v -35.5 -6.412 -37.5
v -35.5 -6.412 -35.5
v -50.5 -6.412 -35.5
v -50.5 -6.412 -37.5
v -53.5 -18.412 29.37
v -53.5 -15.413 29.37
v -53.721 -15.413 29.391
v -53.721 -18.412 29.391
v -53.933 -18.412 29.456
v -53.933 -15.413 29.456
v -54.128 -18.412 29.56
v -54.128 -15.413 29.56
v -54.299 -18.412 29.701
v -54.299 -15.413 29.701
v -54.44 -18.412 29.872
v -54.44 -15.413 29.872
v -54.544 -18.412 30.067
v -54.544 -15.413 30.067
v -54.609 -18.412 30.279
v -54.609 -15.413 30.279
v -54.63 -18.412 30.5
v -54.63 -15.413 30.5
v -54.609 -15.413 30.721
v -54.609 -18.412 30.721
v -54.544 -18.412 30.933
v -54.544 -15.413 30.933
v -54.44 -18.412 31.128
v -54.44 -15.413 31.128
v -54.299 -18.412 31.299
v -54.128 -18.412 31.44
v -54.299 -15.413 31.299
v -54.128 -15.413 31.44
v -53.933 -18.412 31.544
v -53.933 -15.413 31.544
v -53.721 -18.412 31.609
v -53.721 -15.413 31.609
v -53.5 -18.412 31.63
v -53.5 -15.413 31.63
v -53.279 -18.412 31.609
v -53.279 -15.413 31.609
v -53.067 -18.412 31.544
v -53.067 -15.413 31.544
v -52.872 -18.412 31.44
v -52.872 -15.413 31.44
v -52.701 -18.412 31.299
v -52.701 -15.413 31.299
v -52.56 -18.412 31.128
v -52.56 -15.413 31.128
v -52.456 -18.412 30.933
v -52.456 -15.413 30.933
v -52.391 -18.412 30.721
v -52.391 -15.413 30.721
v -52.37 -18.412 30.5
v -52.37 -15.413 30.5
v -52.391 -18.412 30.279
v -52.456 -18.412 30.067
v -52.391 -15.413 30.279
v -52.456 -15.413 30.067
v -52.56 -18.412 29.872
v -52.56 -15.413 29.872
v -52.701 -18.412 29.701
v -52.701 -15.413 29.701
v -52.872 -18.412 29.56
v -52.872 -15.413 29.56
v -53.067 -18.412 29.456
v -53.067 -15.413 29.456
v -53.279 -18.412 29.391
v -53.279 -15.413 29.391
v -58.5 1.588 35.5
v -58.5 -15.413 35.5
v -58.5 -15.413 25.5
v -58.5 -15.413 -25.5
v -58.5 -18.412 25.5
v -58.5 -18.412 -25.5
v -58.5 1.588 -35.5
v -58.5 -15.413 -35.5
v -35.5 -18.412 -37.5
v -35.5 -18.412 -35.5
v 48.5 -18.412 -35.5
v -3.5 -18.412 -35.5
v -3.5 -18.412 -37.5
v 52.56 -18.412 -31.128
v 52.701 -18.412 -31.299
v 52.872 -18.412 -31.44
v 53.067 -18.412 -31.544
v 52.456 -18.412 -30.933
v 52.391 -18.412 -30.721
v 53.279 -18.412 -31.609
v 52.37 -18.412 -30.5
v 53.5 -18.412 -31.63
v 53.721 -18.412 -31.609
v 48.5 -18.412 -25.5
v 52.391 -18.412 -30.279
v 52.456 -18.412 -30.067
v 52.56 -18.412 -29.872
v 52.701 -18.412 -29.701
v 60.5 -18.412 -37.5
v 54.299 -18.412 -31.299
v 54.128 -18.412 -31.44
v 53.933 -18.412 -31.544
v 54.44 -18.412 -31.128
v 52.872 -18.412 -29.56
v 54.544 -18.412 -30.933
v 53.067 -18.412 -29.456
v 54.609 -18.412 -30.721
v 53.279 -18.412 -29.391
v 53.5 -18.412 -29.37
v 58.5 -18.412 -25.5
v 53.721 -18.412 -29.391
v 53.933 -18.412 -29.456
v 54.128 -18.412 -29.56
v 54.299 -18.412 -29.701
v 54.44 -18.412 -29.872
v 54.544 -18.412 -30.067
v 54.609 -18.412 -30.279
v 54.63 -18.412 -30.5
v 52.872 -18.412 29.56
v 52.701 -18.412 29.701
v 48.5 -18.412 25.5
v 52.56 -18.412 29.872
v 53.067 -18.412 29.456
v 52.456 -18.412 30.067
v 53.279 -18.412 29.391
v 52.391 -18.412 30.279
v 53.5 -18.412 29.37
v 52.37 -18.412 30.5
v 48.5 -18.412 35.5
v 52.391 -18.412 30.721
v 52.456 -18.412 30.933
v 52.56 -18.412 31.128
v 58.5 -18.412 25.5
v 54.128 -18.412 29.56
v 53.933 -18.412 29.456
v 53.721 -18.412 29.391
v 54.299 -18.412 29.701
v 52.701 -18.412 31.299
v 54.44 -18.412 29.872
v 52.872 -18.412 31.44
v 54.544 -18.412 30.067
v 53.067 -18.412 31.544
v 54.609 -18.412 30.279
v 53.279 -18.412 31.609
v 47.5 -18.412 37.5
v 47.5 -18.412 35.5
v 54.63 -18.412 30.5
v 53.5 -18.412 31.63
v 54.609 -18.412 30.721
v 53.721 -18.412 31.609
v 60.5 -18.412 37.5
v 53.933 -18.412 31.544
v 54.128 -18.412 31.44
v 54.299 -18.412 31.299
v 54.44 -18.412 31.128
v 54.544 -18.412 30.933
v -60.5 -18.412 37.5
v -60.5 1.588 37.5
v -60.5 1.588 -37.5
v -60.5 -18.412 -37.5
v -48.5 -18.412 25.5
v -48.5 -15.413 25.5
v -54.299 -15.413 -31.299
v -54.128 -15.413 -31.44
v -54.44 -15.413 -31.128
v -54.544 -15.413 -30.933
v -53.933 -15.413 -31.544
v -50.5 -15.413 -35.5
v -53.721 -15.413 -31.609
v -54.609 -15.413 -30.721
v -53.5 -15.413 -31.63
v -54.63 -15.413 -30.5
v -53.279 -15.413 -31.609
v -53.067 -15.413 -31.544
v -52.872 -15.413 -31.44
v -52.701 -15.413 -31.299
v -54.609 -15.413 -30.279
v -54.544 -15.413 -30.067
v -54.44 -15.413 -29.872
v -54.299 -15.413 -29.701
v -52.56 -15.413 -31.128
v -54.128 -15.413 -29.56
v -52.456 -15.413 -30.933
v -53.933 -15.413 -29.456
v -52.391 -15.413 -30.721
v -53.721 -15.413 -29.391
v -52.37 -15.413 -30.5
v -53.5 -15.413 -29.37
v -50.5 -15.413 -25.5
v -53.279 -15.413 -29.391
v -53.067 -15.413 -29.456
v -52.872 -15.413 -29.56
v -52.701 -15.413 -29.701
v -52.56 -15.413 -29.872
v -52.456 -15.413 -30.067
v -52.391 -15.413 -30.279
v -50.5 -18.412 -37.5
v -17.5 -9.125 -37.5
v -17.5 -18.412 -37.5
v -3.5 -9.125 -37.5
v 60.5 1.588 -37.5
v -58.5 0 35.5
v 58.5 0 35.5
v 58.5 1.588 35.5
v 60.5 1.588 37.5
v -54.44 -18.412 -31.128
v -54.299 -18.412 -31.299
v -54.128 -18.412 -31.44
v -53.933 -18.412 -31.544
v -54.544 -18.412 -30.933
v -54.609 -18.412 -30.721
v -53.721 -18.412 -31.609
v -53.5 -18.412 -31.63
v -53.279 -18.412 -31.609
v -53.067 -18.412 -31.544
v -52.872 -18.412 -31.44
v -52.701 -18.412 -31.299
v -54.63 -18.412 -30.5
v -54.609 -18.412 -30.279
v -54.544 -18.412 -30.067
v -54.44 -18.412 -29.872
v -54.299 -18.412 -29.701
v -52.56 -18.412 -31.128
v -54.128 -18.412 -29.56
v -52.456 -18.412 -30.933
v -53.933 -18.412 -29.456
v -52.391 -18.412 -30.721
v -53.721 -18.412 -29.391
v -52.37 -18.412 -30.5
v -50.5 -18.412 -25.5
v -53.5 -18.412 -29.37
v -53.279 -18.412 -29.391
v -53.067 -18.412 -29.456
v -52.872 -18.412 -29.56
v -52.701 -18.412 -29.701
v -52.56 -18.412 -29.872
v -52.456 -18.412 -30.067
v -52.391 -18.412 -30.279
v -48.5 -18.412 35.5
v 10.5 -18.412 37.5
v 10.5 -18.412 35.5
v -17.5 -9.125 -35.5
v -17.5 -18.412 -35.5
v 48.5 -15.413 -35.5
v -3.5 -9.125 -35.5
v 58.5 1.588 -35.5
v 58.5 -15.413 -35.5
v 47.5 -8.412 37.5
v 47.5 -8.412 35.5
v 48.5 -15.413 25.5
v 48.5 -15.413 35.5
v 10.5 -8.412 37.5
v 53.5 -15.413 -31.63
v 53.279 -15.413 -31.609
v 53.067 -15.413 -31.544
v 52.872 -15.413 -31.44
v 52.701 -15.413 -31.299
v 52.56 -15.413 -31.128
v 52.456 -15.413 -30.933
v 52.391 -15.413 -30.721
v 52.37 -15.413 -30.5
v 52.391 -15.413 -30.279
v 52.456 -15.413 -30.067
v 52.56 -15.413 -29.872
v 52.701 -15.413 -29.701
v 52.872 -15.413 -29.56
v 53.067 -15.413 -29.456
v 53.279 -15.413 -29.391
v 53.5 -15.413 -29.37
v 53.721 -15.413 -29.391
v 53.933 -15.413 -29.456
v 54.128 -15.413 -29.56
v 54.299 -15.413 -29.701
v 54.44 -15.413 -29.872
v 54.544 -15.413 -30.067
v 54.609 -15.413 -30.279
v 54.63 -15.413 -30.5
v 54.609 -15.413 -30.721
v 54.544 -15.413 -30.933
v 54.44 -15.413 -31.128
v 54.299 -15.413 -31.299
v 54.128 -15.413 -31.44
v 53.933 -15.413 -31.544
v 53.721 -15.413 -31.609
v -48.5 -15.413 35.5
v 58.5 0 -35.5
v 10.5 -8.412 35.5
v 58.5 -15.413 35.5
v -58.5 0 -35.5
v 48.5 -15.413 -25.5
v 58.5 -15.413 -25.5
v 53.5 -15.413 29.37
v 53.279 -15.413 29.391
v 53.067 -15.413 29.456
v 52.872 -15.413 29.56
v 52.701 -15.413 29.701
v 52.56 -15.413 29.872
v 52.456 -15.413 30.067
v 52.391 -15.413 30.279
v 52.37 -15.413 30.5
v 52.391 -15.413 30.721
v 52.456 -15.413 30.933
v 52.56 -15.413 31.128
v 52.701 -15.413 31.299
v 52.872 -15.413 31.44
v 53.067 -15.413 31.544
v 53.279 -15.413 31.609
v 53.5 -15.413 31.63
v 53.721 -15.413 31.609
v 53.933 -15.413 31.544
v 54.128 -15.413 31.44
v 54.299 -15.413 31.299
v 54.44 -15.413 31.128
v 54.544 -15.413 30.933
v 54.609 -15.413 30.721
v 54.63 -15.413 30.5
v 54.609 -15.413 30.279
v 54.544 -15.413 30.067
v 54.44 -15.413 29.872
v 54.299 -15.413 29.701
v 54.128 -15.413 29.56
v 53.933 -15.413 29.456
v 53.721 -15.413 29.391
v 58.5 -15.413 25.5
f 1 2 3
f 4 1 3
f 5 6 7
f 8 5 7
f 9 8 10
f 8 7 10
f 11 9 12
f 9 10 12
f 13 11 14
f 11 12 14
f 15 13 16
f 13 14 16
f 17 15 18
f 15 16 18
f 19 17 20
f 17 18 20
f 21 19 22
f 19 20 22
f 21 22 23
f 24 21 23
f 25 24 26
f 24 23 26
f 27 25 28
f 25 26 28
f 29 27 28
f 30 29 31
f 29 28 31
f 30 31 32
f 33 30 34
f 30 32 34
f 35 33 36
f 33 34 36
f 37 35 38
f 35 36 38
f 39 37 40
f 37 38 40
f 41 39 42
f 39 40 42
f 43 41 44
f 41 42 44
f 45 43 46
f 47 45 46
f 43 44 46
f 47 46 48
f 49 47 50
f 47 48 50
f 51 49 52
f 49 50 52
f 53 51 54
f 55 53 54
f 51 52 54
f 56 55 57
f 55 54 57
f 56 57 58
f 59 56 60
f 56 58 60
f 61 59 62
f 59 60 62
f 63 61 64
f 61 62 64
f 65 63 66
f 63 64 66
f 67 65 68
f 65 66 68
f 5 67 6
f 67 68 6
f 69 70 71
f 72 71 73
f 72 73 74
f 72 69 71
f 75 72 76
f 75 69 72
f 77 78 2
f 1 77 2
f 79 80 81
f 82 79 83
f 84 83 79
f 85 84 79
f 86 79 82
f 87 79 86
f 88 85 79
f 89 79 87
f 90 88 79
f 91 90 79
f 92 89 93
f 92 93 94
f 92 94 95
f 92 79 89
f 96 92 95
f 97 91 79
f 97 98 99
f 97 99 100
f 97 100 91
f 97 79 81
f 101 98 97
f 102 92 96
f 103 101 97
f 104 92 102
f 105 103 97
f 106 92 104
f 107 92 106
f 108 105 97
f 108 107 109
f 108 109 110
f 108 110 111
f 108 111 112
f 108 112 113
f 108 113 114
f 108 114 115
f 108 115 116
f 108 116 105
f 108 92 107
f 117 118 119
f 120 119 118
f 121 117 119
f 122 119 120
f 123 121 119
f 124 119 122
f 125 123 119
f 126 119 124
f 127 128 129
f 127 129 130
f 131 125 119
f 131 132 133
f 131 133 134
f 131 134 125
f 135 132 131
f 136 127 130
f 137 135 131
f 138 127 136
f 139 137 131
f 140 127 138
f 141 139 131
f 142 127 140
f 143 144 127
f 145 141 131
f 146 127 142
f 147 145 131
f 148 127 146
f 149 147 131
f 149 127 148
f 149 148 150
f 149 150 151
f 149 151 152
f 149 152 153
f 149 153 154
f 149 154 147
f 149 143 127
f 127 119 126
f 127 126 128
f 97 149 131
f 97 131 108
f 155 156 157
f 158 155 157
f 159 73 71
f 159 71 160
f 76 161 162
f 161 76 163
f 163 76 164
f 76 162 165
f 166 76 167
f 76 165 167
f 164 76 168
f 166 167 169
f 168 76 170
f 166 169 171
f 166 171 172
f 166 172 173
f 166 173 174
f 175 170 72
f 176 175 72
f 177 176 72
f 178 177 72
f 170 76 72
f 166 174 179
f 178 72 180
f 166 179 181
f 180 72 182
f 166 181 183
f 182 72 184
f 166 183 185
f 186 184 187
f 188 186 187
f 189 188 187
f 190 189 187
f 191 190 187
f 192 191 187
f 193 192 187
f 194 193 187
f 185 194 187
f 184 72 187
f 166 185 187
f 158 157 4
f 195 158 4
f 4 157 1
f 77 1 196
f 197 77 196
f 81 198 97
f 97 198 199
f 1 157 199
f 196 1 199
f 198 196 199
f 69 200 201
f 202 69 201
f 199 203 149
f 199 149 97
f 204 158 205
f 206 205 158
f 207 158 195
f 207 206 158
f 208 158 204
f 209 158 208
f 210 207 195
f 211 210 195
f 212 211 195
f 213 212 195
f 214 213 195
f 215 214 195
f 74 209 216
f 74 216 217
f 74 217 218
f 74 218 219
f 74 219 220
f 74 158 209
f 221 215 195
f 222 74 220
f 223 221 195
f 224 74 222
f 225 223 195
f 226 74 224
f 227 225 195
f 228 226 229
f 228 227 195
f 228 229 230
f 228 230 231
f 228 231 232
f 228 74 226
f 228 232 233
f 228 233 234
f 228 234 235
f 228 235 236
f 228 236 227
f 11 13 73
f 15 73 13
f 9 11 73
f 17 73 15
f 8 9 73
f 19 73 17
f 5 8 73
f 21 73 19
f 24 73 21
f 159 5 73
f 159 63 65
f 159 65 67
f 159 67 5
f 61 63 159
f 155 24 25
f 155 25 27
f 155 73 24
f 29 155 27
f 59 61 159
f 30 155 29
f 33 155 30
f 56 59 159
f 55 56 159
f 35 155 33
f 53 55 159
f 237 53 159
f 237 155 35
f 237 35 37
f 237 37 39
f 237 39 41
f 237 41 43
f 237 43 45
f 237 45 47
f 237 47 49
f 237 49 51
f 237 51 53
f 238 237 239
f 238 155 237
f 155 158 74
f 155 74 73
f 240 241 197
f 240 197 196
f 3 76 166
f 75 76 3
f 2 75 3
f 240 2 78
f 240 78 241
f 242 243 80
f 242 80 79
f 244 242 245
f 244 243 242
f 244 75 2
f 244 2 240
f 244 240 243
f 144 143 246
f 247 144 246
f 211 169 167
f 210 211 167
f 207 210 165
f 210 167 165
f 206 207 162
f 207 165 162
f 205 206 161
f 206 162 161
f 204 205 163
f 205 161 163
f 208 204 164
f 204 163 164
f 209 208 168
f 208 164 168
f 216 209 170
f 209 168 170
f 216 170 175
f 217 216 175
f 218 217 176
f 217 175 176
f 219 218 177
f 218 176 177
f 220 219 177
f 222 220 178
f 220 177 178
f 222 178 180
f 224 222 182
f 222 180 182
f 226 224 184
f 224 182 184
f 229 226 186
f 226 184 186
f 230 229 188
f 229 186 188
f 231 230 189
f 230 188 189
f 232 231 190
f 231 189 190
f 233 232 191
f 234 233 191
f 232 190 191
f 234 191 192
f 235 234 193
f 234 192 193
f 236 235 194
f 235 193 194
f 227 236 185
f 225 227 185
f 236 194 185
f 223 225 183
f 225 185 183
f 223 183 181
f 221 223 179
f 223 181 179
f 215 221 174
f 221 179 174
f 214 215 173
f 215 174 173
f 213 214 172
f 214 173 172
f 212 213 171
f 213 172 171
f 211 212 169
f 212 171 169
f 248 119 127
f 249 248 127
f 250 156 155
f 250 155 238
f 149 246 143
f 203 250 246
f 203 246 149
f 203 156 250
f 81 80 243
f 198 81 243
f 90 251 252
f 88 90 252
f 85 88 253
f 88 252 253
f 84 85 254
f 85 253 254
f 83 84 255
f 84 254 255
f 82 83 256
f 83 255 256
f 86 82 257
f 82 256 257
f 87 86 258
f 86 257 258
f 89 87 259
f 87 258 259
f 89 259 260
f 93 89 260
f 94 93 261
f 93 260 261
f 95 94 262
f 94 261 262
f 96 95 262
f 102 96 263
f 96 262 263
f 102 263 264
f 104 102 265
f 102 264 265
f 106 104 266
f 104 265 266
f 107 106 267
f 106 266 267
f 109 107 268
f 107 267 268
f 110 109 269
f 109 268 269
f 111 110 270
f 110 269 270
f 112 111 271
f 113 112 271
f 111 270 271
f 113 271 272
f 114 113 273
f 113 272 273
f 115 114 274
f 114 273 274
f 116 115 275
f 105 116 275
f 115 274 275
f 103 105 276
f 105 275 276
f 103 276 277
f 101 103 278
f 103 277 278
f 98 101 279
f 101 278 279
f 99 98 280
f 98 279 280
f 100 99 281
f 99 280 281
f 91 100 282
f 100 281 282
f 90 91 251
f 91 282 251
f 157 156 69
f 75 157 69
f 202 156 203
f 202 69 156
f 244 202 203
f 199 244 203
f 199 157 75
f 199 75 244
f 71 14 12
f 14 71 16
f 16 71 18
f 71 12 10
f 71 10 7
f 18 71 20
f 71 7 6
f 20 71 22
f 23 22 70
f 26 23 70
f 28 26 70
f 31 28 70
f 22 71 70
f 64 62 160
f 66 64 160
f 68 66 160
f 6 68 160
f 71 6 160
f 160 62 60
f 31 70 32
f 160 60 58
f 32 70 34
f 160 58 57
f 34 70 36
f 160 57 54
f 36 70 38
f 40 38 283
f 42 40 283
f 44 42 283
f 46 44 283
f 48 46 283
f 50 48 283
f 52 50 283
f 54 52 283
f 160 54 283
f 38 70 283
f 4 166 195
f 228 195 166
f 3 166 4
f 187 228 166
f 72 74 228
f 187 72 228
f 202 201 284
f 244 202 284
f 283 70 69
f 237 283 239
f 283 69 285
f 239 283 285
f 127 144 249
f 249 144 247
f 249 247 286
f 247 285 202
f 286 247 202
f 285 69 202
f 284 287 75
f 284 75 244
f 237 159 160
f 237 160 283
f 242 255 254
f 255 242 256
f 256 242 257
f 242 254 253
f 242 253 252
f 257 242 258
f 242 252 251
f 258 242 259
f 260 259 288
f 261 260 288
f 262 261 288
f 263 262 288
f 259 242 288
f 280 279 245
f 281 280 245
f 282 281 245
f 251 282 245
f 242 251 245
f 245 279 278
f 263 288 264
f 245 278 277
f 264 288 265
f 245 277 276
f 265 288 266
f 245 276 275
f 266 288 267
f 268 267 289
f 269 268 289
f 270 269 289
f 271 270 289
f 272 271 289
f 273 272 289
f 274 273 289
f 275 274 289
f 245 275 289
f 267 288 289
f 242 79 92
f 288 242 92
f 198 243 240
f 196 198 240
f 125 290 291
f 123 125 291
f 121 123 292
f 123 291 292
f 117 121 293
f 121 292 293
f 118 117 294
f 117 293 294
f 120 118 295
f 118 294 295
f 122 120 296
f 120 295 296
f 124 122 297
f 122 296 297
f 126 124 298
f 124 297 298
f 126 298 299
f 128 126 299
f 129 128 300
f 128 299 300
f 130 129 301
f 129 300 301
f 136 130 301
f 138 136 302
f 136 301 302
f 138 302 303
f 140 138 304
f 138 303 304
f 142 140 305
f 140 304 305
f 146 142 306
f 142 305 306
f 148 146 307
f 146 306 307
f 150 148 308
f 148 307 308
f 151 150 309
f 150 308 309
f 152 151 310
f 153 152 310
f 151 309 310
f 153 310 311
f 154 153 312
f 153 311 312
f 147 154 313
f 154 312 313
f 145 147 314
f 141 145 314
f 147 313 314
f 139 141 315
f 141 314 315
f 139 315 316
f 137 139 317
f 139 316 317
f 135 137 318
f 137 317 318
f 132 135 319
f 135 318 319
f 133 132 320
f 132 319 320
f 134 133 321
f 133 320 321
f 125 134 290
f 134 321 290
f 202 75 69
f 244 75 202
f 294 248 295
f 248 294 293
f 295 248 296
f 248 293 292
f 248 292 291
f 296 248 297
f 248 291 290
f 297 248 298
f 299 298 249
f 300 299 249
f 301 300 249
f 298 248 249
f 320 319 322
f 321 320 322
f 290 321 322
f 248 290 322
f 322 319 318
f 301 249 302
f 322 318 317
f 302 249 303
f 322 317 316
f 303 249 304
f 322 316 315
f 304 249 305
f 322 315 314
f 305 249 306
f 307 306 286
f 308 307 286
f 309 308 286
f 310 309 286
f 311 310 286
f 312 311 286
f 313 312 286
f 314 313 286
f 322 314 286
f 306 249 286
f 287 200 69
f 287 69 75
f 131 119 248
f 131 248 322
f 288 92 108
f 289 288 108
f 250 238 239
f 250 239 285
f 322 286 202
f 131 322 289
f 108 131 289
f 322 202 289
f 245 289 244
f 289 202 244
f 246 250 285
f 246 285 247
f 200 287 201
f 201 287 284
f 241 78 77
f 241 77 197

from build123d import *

# Parameters (mm, degrees)
SKETCH1_W                      = 117
SKETCH1_H                      = 71
TOPSHIELD_DEPTH                = 1.5875
SKETCH4_W                      = 121
SKETCH4_H                      = 75
SKETCH4_W_2                    = 117
SKETCH4_H_2                    = 71
WALLS_DEPTH                    = 20
SKETCH5_W                      = 10
SKETCH5_H                      = 10
MOUNTS_DEPTH                   = 3
SKETCH3_W                      = 1.1303
SKETCH3_H                      = 20
F_4_40_TAPPED_HOLE1_AT_2_COUNT = 2
F_4_40_TAPPED_HOLE1_AT_2_PITCH = 107
F_4_40_TAPPED_HOLE1_AT_3_COUNT = 2
F_4_40_TAPPED_HOLE1_AT_3_PITCH = 123.166553902
F_4_40_TAPPED_HOLE1_AT_4_COUNT = 2
F_4_40_TAPPED_HOLE1_AT_4_PITCH = 61
POWERANDMOTOR_START            = -12
SKETCH6_W                      = 15
SKETCH6_H                      = 12
SKETCH6_W_2                    = 14
SKETCH6_H_2                    = 9.287923088
POWERANDMOTOR_DEPTH            = 12
SKETCH7_W                      = 37
SKETCH7_H                      = 10
CONTROLS_DEPTH                 = 2


with BuildPart() as part:
    # Sketch1 → TopShield (new body)
    with BuildSketch(Plane(origin=(0, 0, 0), x_dir=(1, 0, 0), z_dir=(0, 1, 0))):
        Rectangle(SKETCH1_W, SKETCH1_H)
    extrude(amount=TOPSHIELD_DEPTH)


with BuildPart() as body_2:
    # Sketch4 → Walls (new body)
    with BuildSketch(Plane(origin=(0, 1.5875, 0), x_dir=(1, 0, 0), z_dir=(0, 1, 0))):
        Rectangle(SKETCH4_W, SKETCH4_H)
        Rectangle(SKETCH4_W_2, SKETCH4_H_2, mode=Mode.SUBTRACT)
    extrude(amount=-WALLS_DEPTH)

    # Sketch5 → Mounts (add)
    with BuildSketch(Plane.XZ.offset(18.4125)):
        with Locations((-53.5, 30.5)):
            Rectangle(SKETCH5_W, SKETCH5_H)
        with Locations((53.5, 30.5)):
            Rectangle(SKETCH5_W, SKETCH5_H)
        with Locations((53.5, -30.5)):
            Rectangle(SKETCH5_W, SKETCH5_H)
        with Locations((-53.5, -30.5)):
            Rectangle(SKETCH5_W, SKETCH5_H)
    extrude(amount=-MOUNTS_DEPTH)

    # Sketch3 → #4-40 Tapped Hole1 (revolve, cut)
    with BuildSketch(Plane(origin=(-53.5, -18.4125, -30.5), x_dir=(0, 0, -1), z_dir=(1, 0, 0))):
        with Locations((0.56515, 10)):
            Rectangle(SKETCH3_W, SKETCH3_H)
    f_4_40_tapped_hole1 = revolve(axis=Axis((-53.5, -24.7625, -30.5), (0, 1, 0)), mode=Mode.SUBTRACT)

    # #4-40 Tapped Hole1 at 2: #4-40 Tapped Hole1 ×2
    with Locations(*[(i * F_4_40_TAPPED_HOLE1_AT_2_PITCH, 0, 0) for i in range(1, F_4_40_TAPPED_HOLE1_AT_2_COUNT)]):
        add(f_4_40_tapped_hole1, mode=Mode.SUBTRACT)

    # #4-40 Tapped Hole1 at 3: #4-40 Tapped Hole1 ×2
    with Locations(*[Vector(0.8687423380008604, 0, 0.49526432353320055) * (i * F_4_40_TAPPED_HOLE1_AT_3_PITCH) for i in range(1, F_4_40_TAPPED_HOLE1_AT_3_COUNT)]):
        add(f_4_40_tapped_hole1, mode=Mode.SUBTRACT)

    # #4-40 Tapped Hole1 at 4: #4-40 Tapped Hole1 ×2
    with Locations(*[(0, 0, i * F_4_40_TAPPED_HOLE1_AT_4_PITCH) for i in range(1, F_4_40_TAPPED_HOLE1_AT_4_COUNT)]):
        add(f_4_40_tapped_hole1, mode=Mode.SUBTRACT)

    # Sketch6 → PowerAndMotor (cut)
    with BuildSketch(Plane(origin=(0, 0, -37.5), x_dir=(-1, 0, 0), z_dir=(0, 0, -1)).offset(POWERANDMOTOR_START)):
        with Locations((43, -12.4125)):
            Rectangle(SKETCH6_W, SKETCH6_H)
        with Locations((10.5, -13.768538456)):
            Rectangle(SKETCH6_W_2, SKETCH6_H_2)
    extrude(amount=POWERANDMOTOR_DEPTH, mode=Mode.SUBTRACT)

    # Sketch7 → Controls (cut)
    with BuildSketch(Plane.XY.offset(37.5)):
        with Locations((29, -13.4125)):
            Rectangle(SKETCH7_W, SKETCH7_H)
    extrude(amount=-CONTROLS_DEPTH, mode=Mode.SUBTRACT)


solid = Compound([part.part, body_2.part])
